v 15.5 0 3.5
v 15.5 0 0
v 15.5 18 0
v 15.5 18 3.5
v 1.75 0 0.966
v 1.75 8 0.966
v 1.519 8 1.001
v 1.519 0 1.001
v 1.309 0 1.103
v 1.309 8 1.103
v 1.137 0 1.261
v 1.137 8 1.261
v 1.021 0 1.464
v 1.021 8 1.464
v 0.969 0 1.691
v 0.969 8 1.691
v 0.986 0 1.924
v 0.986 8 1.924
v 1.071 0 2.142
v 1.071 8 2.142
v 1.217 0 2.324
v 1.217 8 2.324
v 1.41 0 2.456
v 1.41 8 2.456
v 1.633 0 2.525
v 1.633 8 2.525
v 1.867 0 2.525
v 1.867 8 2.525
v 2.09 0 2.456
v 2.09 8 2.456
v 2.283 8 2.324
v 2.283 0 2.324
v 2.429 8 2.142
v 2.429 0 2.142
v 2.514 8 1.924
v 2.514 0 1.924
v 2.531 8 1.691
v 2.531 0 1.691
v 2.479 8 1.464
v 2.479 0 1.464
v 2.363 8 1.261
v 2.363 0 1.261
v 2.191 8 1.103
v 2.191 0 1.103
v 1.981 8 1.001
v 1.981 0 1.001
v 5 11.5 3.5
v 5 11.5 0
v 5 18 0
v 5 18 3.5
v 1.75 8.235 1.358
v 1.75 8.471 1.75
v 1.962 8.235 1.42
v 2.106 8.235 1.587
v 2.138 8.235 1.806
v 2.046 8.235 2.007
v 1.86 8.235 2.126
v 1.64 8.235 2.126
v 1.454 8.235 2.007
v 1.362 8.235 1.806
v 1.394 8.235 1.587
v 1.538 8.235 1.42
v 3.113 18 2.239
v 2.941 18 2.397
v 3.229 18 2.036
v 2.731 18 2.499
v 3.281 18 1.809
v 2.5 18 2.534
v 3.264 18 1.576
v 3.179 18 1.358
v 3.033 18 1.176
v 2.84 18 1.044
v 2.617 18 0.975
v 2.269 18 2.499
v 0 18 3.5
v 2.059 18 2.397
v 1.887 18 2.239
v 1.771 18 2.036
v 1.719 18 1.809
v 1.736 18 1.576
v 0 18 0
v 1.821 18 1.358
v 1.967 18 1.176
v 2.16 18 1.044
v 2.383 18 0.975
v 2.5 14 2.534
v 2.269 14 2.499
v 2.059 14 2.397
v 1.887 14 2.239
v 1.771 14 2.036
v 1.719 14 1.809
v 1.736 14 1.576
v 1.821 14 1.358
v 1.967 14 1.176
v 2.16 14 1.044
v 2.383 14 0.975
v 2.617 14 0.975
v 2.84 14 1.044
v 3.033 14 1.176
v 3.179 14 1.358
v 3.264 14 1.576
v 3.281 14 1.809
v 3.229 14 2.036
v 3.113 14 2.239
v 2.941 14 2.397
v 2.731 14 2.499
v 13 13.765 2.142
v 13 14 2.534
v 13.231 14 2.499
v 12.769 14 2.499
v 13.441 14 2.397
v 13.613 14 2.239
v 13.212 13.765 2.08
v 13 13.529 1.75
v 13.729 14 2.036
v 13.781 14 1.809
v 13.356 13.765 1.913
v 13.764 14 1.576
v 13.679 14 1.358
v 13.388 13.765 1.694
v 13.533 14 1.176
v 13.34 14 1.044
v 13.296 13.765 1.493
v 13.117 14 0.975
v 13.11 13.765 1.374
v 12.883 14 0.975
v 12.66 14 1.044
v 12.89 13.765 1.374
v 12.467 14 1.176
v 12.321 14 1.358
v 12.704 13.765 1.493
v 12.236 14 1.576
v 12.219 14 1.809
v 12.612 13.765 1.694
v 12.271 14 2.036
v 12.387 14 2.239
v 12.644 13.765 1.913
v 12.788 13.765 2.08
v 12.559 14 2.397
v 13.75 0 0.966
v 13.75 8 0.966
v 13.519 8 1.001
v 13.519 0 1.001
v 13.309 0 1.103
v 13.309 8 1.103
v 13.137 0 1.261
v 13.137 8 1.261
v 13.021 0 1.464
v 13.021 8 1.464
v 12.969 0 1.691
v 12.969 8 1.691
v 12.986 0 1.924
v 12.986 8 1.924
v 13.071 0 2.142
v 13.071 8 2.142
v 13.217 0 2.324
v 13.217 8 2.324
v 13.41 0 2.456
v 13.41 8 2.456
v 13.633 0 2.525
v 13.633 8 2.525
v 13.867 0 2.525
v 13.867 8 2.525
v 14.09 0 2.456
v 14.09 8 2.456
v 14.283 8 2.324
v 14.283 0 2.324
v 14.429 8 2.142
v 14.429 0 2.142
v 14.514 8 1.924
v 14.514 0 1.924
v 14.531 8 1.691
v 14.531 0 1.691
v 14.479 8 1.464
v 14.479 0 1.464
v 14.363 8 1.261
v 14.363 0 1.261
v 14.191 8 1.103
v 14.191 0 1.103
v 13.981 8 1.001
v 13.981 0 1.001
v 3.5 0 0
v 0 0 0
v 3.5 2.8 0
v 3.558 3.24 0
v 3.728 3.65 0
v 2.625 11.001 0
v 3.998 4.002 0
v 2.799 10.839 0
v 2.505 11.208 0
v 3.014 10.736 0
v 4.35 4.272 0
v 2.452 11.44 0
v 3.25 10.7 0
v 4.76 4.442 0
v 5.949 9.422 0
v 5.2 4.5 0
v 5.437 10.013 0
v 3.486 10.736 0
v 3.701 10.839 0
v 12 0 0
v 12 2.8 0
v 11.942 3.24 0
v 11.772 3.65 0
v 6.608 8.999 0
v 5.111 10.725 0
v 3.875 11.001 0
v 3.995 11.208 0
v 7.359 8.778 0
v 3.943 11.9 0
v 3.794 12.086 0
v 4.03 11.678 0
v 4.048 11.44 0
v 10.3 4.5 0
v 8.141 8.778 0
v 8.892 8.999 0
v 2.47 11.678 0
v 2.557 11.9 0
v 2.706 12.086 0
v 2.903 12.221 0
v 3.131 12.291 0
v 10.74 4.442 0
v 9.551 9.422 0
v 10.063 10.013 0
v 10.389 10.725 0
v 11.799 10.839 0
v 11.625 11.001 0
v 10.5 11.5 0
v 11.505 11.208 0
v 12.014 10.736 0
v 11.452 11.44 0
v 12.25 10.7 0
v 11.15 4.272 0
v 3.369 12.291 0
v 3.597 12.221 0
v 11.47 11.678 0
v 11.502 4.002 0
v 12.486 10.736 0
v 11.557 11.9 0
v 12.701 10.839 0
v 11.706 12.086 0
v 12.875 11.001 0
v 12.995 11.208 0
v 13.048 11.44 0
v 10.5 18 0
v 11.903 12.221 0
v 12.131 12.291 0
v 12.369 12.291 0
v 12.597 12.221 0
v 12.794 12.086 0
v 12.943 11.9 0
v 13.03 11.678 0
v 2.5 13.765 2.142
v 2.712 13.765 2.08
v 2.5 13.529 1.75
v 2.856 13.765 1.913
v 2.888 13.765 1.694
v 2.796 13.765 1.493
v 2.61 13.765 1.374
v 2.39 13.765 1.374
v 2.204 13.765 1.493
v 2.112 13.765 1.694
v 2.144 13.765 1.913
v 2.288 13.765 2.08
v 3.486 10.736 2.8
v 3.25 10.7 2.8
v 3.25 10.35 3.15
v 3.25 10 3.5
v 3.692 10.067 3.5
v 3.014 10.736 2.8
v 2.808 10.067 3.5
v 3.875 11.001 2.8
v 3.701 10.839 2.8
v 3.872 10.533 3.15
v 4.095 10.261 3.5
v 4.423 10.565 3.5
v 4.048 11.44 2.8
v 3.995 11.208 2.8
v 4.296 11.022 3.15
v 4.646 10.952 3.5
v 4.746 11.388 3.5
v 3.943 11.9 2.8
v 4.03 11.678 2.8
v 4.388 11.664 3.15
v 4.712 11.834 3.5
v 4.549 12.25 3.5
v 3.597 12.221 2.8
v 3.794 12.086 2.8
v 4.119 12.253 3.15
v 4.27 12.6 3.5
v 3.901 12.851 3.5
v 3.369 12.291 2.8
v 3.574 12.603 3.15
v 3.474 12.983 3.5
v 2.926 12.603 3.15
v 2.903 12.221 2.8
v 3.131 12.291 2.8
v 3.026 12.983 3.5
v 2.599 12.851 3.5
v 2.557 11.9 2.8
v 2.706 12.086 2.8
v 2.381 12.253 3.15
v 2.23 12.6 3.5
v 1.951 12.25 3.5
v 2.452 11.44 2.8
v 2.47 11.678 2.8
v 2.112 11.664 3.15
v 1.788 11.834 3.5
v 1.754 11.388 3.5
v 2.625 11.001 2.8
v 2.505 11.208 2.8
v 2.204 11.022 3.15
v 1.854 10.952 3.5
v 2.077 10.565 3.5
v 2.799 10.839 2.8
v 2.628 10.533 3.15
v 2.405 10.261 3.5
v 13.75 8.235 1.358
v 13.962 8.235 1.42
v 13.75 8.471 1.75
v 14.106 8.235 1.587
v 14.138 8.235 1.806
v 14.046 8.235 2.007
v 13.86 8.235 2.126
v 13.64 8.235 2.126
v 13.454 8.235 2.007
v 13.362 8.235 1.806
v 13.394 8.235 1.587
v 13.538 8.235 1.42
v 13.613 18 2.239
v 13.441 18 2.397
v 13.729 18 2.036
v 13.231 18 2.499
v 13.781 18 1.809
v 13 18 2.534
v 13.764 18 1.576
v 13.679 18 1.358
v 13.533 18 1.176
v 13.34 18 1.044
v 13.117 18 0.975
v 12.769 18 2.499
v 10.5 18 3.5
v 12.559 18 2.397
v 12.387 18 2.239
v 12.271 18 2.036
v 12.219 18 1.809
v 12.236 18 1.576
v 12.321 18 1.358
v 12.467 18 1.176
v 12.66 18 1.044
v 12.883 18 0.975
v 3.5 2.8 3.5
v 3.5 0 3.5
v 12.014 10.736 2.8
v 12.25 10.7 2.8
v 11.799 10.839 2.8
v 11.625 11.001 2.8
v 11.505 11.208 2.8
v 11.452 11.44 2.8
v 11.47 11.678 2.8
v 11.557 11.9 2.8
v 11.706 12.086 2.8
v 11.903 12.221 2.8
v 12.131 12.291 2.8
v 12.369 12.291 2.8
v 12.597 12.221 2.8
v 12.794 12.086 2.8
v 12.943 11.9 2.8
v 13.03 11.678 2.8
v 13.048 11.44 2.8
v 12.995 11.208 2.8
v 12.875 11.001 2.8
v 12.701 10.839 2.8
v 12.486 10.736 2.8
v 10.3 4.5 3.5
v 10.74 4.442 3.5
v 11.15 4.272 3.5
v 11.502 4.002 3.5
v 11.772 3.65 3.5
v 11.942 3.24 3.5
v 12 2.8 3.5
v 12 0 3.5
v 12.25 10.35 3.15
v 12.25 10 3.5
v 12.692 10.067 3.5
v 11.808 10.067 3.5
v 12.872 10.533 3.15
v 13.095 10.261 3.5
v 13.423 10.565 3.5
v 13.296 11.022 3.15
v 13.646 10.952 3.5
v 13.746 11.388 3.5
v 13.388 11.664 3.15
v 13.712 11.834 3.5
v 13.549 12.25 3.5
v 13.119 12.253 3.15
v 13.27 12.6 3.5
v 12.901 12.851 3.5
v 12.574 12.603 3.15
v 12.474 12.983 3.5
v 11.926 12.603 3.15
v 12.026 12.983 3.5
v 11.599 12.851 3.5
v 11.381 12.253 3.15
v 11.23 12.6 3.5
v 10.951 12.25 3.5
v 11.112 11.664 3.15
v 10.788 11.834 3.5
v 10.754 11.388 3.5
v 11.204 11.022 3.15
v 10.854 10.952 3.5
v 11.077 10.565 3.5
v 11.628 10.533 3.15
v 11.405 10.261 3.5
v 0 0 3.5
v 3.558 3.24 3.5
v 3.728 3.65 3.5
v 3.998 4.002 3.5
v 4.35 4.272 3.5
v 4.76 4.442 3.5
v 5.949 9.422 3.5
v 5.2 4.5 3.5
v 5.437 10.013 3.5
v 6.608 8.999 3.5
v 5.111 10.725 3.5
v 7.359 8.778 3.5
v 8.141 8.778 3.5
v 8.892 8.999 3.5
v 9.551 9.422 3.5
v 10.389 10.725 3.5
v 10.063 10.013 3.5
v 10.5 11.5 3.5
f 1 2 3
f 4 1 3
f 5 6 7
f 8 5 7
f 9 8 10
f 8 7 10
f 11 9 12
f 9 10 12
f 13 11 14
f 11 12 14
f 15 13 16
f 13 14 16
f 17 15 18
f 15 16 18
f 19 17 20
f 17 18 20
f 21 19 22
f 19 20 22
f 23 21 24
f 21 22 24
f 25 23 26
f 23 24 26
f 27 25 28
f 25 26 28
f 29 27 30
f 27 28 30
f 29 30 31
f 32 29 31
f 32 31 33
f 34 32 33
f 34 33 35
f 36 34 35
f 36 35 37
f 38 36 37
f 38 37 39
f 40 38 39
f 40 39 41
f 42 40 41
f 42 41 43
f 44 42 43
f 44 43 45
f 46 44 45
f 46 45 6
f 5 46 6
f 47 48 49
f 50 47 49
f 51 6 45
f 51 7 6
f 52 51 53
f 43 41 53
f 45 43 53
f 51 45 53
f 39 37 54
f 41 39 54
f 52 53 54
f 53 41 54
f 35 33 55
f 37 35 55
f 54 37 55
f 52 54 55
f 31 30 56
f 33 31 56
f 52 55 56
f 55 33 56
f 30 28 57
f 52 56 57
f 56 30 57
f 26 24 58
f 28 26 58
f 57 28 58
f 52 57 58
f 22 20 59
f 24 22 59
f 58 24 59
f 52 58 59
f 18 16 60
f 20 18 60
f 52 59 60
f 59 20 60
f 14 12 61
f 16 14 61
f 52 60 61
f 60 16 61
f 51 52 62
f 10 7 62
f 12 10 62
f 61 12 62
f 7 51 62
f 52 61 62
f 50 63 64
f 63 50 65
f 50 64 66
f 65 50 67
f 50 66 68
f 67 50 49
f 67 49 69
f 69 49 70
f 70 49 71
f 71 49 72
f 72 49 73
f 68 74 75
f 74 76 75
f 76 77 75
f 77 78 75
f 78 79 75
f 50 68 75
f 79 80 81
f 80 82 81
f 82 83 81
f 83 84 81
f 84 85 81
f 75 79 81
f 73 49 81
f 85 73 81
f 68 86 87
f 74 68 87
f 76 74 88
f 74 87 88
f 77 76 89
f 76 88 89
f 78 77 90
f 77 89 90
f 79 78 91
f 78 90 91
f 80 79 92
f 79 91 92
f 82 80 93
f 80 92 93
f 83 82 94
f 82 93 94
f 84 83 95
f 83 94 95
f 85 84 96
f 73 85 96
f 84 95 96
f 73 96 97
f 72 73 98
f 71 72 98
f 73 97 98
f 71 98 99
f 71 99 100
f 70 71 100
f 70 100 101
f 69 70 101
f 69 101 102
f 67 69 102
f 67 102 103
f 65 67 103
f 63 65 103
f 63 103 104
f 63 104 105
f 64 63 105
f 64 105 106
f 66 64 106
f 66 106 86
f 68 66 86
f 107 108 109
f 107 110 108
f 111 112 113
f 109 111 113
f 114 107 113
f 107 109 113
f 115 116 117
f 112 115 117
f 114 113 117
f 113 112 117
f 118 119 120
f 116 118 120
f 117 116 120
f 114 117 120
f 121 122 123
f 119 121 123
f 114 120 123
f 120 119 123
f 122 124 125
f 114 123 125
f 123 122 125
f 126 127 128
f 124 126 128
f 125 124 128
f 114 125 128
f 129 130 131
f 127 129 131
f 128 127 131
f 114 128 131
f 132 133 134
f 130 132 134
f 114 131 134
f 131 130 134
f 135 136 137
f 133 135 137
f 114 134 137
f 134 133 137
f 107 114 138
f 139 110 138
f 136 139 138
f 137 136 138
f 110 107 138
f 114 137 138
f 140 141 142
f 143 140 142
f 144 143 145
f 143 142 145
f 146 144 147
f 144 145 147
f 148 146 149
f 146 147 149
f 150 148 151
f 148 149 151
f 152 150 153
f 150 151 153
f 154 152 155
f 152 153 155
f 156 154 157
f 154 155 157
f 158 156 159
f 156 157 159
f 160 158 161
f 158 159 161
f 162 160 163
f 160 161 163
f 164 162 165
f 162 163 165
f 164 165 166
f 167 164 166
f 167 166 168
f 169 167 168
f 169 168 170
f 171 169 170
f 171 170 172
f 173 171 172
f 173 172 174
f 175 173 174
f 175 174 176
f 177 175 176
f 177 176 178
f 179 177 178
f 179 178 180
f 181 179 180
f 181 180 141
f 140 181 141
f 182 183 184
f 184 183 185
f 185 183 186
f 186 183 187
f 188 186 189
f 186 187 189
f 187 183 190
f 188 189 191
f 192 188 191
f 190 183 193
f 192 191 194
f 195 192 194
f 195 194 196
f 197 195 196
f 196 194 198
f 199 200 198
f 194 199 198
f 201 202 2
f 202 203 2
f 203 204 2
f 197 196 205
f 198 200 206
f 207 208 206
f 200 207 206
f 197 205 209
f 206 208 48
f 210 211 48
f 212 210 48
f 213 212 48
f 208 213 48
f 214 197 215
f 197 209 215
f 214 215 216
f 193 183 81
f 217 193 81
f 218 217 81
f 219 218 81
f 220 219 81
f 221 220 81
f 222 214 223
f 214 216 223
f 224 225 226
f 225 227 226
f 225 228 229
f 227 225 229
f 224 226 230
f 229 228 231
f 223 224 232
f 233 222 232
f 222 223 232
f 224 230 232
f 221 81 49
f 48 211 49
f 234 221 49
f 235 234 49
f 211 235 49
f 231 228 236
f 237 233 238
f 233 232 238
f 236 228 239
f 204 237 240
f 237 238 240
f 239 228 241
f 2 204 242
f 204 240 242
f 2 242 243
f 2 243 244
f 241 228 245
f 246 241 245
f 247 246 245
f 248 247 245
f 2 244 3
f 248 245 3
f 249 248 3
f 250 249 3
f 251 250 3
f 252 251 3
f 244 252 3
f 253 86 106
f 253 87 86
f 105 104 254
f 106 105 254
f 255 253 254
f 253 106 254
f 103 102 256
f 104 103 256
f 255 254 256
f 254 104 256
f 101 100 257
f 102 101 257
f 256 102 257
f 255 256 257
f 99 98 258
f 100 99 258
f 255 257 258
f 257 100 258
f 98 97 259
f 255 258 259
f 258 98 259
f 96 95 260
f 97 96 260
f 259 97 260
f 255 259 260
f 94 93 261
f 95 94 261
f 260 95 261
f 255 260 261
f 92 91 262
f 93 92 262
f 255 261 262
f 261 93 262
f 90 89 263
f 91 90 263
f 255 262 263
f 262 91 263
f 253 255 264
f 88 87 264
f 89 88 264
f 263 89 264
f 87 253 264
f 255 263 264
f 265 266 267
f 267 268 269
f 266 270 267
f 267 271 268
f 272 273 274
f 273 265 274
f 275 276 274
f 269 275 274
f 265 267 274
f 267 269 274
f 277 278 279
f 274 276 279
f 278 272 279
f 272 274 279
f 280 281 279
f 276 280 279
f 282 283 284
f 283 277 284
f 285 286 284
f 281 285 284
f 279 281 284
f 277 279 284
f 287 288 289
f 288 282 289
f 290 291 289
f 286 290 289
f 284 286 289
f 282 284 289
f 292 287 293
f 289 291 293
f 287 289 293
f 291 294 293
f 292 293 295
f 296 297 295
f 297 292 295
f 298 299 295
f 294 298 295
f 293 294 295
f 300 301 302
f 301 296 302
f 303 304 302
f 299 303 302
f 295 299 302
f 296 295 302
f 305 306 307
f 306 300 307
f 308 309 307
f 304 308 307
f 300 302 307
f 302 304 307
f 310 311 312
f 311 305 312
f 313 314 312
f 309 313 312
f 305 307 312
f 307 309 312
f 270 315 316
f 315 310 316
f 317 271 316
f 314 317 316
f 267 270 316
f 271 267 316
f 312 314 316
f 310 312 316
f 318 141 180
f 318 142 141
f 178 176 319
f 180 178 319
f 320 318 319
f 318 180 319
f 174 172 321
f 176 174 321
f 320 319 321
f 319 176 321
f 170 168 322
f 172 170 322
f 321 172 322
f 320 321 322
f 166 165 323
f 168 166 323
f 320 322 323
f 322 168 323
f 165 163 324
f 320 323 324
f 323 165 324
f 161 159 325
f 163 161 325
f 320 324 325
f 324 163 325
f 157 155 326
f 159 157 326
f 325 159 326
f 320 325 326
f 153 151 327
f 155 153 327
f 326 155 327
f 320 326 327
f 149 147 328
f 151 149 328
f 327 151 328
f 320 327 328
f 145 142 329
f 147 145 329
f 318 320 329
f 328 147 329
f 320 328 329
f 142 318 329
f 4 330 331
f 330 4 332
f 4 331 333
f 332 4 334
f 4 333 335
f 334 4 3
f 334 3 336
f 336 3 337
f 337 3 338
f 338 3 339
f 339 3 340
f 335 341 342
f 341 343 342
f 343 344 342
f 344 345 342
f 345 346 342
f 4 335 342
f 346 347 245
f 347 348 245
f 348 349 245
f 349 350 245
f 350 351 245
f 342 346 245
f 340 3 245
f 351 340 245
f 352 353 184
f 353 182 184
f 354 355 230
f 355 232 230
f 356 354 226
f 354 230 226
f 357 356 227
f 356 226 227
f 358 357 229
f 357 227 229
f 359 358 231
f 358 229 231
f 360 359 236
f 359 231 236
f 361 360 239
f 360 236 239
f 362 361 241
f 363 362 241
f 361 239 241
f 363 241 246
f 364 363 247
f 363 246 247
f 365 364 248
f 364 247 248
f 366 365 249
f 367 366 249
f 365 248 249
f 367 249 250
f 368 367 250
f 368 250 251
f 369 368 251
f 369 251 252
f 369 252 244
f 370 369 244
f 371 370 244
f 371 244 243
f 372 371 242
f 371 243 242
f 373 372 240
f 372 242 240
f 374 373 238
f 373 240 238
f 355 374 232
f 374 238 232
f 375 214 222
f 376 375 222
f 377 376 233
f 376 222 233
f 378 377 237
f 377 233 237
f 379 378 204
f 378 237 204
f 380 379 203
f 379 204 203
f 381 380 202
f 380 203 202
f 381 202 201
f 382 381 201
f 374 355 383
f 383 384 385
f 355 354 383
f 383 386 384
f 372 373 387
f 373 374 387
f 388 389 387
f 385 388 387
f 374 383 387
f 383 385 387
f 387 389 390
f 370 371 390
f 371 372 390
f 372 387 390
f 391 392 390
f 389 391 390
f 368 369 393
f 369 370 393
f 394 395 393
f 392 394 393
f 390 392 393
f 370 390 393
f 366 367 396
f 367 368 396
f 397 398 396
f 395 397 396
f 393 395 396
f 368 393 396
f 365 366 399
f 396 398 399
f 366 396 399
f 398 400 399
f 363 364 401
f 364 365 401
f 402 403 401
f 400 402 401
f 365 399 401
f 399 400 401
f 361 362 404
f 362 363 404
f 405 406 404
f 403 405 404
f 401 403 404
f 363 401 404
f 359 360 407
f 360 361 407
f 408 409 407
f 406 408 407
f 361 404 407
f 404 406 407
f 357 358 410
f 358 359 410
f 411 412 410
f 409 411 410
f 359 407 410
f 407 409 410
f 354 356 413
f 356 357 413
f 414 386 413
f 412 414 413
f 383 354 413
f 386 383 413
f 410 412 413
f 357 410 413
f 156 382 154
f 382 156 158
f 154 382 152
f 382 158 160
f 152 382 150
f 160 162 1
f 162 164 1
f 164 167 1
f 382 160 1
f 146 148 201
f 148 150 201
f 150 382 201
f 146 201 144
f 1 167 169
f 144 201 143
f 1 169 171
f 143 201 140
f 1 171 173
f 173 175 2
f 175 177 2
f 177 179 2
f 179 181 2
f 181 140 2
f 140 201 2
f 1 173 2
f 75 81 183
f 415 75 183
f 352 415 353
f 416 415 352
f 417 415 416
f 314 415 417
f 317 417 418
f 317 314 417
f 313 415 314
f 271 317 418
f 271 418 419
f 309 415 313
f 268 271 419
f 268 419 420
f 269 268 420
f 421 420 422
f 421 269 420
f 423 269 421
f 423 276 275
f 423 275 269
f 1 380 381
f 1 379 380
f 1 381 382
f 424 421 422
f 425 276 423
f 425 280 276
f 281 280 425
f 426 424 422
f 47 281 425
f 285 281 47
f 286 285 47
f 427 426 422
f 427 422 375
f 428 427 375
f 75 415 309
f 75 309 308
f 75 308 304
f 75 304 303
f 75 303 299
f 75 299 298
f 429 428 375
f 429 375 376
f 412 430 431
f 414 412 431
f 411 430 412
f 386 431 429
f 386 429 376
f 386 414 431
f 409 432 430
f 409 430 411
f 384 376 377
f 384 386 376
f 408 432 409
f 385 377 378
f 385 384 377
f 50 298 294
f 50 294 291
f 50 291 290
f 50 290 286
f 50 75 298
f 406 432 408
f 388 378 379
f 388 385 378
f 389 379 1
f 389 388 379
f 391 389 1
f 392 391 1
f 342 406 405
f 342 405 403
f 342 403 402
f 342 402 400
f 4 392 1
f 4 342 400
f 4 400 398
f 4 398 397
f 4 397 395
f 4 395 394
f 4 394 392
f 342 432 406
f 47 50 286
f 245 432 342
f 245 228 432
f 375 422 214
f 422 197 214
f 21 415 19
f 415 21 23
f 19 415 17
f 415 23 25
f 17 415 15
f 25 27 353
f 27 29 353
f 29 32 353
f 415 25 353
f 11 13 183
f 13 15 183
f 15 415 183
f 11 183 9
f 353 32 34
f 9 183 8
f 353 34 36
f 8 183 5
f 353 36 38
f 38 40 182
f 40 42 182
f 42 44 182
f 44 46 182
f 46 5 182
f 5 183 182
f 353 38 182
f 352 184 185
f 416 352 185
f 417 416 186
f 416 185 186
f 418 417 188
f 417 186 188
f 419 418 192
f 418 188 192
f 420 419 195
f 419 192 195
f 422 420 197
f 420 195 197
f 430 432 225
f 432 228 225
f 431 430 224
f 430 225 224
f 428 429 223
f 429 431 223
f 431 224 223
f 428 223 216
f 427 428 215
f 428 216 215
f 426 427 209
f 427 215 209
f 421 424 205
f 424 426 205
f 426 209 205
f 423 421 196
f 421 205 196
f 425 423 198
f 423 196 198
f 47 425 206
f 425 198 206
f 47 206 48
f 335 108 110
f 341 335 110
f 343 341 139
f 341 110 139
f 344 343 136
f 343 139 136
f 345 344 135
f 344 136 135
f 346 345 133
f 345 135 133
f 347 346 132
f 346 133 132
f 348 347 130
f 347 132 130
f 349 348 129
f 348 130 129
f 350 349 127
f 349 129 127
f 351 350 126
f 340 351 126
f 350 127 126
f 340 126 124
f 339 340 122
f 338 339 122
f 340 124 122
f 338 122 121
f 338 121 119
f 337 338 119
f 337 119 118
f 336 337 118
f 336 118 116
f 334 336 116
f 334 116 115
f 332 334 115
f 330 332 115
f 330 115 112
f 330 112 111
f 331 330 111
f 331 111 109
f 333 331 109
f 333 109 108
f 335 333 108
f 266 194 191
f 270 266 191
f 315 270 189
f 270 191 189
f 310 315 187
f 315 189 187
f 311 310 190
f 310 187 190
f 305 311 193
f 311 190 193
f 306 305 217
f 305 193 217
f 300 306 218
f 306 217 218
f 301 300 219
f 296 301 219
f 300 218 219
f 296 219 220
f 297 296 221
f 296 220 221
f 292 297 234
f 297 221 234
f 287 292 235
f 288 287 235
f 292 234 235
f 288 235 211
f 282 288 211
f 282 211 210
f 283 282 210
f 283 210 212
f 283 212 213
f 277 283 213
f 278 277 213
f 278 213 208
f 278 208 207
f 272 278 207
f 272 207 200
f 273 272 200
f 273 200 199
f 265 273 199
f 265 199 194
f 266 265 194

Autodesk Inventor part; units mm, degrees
ref_plane "YZ Plane" through (0, 0, 0) normal (1, 0, 0) x (0, 1, 0)
ref_plane "XZ Plane" through (0, 0, 0) normal (0, 1, 0) x (-1, 0, 0)
ref_plane "XY Plane" through (0, 0, 0) normal (0, 0, 1) x (1, 0, 0)
sketch "Sketch1" plane through (0, 0, 0) normal (0, 0, 1) x (1, 0, 0)
  line L0 (15.5, 0) -> (15.5, 18)
  line L1 (0, 18) -> (0, 0)
  line L2 (7.75, 16.4813) -> (7.75, -1.3789) construction
  arc A0 (5, 11.5) -> (10.5, 11.5) centre (7.75, 11.5) ccw
  line L3 (5, 11.5) -> (5, 18)
  line L4 (10.5, 11.5) -> (10.5, 18)
  line L5 (15.5, 18) -> (10.5, 18)
  line L6 (5, 18) -> (0, 18)
  line L7 (3.5, 0) -> (3.5, 2.8)
  line L8 (5.2, 4.5) -> (10.3, 4.5)
  line L9 (12, 2.8) -> (12, 0)
  line L10 (0, 0) -> (3.5, 0)
  line L11 (12, 0) -> (15.5, 0)
  arc A1 (5.2, 4.5) -> (3.5, 2.8) centre (5.2, 2.8) ccw
  arc A2 (12, 2.8) -> (10.3, 4.5) centre (10.3, 2.8) ccw
  line L12 (1.3235, 11.5) -> (14.2571, 11.5) construction
  point P0 (3.25, 11.5)
  point P1 (12.25, 11.5)
  dimension "d0" = 15.5
  dimension "d1" = 18
  dimension "d3" = 5.5
  dimension "d4" = 6.5
  dimension "d5" = 4.5
  dimension "d6" = 8.5
  dimension "d7" = 1.7
  dimension "d8" = 9
sketch "Sketch2" plane through (0, 0, 0) normal (0, 0, 1) x (1, 0, 0)
  line L0 (0, 18) -> (0, 0) projected
  line L1 (5, 18) -> (0, 18) projected
  line L2 (5, 11.5) -> (5, 18) projected
  arc A0 (5, 11.5) -> (10.5, 11.5) centre (7.75, 11.5) ccw projected
  line L3 (10.5, 11.5) -> (10.5, 18) projected
  line L4 (15.5, 18) -> (10.5, 18) projected
  line L5 (15.5, 0) -> (15.5, 18) projected
  line L6 (12, 2.8) -> (12, 0) projected
  line L7 (12, 0) -> (15.5, 0) projected
  arc A1 (12, 2.8) -> (10.3, 4.5) centre (10.3, 2.8) ccw projected
  line L8 (5.2, 4.5) -> (10.3, 4.5) projected
  arc A2 (5.2, 4.5) -> (3.5, 2.8) centre (5.2, 2.8) ccw projected
  line L9 (3.5, 0) -> (3.5, 2.8) projected
  line L10 (0, 0) -> (3.5, 0) projected
extrude "Extrusion1" add sketch "Sketch2" along normal blind 3.5
sketch "Sketch3" plane through (0, 0, 3.5) normal (0, 0, 1) x (1, 0, 0)
  point P0 (0, 0)
  point P1 (3.25, 11.5)
  point P2 (12.25, 11.5)
hole "Hole1" at (3.25, 11.5, 3.5) at (12.25, 11.5, 3.5) direction (0, 0, -1) diameter 1.6 end through all countersink diameter 3 countersink angle 90
sketch "Sketch4" plane through (0, 18, 0) normal (0, 1, 0) x (1, 0, 0)
  line L0 (0, 0) -> (0, -3.5) projected
  line L1 (0, -1.75) -> (15.5, -1.75) construction
  line L2 (15.5, 0) -> (15.5, -3.5) projected
  line L3 (5.2, -3.5) -> (10.3, -3.5) projected
  line L4 (7.75, -3.5) -> (7.75, 0) construction
  point P0 (2.5, -1.75)
  point P1 (13, -1.75)
  dimension "d18" = 10.5
hole "Hole2" at (2.5, 18, 1.75) at (13, 18, 1.75) direction (0, -1, 0) diameter 1.567 depth 4 tip angle 118 thread size "M2x0.4" class "6H" standard "ANSI Metric M Profile"
sketch "Sketch5" plane through (0, 0, 0) normal (0, -1, 0) x (1, 0, 0)
  line L0 (0, 0) -> (0, 3.5) projected
  line L1 (0, 1.75) -> (15.5, 1.75) construction
  line L2 (15.5, 0) -> (15.5, 3.5) projected
  line L3 (5, 3.5) -> (10.5, 3.5) projected
  line L4 (7.75, 3.5) -> (7.75, 0) construction
  line L5 (10.5, 0) -> (5, 0) projected
  point P0 (1.75, 1.75)
  point P1 (13.75, 1.75)
  dimension "d26" = 12
hole "Hole3" at (1.75, 0, 1.75) at (13.75, 0, 1.75) direction (0, 1, 0) diameter 1.567 depth 8 tip angle 118 thread size "M2x0.4" class "6H" standard "ANSI Metric M Profile"
properties part number "mount_motor_side"
